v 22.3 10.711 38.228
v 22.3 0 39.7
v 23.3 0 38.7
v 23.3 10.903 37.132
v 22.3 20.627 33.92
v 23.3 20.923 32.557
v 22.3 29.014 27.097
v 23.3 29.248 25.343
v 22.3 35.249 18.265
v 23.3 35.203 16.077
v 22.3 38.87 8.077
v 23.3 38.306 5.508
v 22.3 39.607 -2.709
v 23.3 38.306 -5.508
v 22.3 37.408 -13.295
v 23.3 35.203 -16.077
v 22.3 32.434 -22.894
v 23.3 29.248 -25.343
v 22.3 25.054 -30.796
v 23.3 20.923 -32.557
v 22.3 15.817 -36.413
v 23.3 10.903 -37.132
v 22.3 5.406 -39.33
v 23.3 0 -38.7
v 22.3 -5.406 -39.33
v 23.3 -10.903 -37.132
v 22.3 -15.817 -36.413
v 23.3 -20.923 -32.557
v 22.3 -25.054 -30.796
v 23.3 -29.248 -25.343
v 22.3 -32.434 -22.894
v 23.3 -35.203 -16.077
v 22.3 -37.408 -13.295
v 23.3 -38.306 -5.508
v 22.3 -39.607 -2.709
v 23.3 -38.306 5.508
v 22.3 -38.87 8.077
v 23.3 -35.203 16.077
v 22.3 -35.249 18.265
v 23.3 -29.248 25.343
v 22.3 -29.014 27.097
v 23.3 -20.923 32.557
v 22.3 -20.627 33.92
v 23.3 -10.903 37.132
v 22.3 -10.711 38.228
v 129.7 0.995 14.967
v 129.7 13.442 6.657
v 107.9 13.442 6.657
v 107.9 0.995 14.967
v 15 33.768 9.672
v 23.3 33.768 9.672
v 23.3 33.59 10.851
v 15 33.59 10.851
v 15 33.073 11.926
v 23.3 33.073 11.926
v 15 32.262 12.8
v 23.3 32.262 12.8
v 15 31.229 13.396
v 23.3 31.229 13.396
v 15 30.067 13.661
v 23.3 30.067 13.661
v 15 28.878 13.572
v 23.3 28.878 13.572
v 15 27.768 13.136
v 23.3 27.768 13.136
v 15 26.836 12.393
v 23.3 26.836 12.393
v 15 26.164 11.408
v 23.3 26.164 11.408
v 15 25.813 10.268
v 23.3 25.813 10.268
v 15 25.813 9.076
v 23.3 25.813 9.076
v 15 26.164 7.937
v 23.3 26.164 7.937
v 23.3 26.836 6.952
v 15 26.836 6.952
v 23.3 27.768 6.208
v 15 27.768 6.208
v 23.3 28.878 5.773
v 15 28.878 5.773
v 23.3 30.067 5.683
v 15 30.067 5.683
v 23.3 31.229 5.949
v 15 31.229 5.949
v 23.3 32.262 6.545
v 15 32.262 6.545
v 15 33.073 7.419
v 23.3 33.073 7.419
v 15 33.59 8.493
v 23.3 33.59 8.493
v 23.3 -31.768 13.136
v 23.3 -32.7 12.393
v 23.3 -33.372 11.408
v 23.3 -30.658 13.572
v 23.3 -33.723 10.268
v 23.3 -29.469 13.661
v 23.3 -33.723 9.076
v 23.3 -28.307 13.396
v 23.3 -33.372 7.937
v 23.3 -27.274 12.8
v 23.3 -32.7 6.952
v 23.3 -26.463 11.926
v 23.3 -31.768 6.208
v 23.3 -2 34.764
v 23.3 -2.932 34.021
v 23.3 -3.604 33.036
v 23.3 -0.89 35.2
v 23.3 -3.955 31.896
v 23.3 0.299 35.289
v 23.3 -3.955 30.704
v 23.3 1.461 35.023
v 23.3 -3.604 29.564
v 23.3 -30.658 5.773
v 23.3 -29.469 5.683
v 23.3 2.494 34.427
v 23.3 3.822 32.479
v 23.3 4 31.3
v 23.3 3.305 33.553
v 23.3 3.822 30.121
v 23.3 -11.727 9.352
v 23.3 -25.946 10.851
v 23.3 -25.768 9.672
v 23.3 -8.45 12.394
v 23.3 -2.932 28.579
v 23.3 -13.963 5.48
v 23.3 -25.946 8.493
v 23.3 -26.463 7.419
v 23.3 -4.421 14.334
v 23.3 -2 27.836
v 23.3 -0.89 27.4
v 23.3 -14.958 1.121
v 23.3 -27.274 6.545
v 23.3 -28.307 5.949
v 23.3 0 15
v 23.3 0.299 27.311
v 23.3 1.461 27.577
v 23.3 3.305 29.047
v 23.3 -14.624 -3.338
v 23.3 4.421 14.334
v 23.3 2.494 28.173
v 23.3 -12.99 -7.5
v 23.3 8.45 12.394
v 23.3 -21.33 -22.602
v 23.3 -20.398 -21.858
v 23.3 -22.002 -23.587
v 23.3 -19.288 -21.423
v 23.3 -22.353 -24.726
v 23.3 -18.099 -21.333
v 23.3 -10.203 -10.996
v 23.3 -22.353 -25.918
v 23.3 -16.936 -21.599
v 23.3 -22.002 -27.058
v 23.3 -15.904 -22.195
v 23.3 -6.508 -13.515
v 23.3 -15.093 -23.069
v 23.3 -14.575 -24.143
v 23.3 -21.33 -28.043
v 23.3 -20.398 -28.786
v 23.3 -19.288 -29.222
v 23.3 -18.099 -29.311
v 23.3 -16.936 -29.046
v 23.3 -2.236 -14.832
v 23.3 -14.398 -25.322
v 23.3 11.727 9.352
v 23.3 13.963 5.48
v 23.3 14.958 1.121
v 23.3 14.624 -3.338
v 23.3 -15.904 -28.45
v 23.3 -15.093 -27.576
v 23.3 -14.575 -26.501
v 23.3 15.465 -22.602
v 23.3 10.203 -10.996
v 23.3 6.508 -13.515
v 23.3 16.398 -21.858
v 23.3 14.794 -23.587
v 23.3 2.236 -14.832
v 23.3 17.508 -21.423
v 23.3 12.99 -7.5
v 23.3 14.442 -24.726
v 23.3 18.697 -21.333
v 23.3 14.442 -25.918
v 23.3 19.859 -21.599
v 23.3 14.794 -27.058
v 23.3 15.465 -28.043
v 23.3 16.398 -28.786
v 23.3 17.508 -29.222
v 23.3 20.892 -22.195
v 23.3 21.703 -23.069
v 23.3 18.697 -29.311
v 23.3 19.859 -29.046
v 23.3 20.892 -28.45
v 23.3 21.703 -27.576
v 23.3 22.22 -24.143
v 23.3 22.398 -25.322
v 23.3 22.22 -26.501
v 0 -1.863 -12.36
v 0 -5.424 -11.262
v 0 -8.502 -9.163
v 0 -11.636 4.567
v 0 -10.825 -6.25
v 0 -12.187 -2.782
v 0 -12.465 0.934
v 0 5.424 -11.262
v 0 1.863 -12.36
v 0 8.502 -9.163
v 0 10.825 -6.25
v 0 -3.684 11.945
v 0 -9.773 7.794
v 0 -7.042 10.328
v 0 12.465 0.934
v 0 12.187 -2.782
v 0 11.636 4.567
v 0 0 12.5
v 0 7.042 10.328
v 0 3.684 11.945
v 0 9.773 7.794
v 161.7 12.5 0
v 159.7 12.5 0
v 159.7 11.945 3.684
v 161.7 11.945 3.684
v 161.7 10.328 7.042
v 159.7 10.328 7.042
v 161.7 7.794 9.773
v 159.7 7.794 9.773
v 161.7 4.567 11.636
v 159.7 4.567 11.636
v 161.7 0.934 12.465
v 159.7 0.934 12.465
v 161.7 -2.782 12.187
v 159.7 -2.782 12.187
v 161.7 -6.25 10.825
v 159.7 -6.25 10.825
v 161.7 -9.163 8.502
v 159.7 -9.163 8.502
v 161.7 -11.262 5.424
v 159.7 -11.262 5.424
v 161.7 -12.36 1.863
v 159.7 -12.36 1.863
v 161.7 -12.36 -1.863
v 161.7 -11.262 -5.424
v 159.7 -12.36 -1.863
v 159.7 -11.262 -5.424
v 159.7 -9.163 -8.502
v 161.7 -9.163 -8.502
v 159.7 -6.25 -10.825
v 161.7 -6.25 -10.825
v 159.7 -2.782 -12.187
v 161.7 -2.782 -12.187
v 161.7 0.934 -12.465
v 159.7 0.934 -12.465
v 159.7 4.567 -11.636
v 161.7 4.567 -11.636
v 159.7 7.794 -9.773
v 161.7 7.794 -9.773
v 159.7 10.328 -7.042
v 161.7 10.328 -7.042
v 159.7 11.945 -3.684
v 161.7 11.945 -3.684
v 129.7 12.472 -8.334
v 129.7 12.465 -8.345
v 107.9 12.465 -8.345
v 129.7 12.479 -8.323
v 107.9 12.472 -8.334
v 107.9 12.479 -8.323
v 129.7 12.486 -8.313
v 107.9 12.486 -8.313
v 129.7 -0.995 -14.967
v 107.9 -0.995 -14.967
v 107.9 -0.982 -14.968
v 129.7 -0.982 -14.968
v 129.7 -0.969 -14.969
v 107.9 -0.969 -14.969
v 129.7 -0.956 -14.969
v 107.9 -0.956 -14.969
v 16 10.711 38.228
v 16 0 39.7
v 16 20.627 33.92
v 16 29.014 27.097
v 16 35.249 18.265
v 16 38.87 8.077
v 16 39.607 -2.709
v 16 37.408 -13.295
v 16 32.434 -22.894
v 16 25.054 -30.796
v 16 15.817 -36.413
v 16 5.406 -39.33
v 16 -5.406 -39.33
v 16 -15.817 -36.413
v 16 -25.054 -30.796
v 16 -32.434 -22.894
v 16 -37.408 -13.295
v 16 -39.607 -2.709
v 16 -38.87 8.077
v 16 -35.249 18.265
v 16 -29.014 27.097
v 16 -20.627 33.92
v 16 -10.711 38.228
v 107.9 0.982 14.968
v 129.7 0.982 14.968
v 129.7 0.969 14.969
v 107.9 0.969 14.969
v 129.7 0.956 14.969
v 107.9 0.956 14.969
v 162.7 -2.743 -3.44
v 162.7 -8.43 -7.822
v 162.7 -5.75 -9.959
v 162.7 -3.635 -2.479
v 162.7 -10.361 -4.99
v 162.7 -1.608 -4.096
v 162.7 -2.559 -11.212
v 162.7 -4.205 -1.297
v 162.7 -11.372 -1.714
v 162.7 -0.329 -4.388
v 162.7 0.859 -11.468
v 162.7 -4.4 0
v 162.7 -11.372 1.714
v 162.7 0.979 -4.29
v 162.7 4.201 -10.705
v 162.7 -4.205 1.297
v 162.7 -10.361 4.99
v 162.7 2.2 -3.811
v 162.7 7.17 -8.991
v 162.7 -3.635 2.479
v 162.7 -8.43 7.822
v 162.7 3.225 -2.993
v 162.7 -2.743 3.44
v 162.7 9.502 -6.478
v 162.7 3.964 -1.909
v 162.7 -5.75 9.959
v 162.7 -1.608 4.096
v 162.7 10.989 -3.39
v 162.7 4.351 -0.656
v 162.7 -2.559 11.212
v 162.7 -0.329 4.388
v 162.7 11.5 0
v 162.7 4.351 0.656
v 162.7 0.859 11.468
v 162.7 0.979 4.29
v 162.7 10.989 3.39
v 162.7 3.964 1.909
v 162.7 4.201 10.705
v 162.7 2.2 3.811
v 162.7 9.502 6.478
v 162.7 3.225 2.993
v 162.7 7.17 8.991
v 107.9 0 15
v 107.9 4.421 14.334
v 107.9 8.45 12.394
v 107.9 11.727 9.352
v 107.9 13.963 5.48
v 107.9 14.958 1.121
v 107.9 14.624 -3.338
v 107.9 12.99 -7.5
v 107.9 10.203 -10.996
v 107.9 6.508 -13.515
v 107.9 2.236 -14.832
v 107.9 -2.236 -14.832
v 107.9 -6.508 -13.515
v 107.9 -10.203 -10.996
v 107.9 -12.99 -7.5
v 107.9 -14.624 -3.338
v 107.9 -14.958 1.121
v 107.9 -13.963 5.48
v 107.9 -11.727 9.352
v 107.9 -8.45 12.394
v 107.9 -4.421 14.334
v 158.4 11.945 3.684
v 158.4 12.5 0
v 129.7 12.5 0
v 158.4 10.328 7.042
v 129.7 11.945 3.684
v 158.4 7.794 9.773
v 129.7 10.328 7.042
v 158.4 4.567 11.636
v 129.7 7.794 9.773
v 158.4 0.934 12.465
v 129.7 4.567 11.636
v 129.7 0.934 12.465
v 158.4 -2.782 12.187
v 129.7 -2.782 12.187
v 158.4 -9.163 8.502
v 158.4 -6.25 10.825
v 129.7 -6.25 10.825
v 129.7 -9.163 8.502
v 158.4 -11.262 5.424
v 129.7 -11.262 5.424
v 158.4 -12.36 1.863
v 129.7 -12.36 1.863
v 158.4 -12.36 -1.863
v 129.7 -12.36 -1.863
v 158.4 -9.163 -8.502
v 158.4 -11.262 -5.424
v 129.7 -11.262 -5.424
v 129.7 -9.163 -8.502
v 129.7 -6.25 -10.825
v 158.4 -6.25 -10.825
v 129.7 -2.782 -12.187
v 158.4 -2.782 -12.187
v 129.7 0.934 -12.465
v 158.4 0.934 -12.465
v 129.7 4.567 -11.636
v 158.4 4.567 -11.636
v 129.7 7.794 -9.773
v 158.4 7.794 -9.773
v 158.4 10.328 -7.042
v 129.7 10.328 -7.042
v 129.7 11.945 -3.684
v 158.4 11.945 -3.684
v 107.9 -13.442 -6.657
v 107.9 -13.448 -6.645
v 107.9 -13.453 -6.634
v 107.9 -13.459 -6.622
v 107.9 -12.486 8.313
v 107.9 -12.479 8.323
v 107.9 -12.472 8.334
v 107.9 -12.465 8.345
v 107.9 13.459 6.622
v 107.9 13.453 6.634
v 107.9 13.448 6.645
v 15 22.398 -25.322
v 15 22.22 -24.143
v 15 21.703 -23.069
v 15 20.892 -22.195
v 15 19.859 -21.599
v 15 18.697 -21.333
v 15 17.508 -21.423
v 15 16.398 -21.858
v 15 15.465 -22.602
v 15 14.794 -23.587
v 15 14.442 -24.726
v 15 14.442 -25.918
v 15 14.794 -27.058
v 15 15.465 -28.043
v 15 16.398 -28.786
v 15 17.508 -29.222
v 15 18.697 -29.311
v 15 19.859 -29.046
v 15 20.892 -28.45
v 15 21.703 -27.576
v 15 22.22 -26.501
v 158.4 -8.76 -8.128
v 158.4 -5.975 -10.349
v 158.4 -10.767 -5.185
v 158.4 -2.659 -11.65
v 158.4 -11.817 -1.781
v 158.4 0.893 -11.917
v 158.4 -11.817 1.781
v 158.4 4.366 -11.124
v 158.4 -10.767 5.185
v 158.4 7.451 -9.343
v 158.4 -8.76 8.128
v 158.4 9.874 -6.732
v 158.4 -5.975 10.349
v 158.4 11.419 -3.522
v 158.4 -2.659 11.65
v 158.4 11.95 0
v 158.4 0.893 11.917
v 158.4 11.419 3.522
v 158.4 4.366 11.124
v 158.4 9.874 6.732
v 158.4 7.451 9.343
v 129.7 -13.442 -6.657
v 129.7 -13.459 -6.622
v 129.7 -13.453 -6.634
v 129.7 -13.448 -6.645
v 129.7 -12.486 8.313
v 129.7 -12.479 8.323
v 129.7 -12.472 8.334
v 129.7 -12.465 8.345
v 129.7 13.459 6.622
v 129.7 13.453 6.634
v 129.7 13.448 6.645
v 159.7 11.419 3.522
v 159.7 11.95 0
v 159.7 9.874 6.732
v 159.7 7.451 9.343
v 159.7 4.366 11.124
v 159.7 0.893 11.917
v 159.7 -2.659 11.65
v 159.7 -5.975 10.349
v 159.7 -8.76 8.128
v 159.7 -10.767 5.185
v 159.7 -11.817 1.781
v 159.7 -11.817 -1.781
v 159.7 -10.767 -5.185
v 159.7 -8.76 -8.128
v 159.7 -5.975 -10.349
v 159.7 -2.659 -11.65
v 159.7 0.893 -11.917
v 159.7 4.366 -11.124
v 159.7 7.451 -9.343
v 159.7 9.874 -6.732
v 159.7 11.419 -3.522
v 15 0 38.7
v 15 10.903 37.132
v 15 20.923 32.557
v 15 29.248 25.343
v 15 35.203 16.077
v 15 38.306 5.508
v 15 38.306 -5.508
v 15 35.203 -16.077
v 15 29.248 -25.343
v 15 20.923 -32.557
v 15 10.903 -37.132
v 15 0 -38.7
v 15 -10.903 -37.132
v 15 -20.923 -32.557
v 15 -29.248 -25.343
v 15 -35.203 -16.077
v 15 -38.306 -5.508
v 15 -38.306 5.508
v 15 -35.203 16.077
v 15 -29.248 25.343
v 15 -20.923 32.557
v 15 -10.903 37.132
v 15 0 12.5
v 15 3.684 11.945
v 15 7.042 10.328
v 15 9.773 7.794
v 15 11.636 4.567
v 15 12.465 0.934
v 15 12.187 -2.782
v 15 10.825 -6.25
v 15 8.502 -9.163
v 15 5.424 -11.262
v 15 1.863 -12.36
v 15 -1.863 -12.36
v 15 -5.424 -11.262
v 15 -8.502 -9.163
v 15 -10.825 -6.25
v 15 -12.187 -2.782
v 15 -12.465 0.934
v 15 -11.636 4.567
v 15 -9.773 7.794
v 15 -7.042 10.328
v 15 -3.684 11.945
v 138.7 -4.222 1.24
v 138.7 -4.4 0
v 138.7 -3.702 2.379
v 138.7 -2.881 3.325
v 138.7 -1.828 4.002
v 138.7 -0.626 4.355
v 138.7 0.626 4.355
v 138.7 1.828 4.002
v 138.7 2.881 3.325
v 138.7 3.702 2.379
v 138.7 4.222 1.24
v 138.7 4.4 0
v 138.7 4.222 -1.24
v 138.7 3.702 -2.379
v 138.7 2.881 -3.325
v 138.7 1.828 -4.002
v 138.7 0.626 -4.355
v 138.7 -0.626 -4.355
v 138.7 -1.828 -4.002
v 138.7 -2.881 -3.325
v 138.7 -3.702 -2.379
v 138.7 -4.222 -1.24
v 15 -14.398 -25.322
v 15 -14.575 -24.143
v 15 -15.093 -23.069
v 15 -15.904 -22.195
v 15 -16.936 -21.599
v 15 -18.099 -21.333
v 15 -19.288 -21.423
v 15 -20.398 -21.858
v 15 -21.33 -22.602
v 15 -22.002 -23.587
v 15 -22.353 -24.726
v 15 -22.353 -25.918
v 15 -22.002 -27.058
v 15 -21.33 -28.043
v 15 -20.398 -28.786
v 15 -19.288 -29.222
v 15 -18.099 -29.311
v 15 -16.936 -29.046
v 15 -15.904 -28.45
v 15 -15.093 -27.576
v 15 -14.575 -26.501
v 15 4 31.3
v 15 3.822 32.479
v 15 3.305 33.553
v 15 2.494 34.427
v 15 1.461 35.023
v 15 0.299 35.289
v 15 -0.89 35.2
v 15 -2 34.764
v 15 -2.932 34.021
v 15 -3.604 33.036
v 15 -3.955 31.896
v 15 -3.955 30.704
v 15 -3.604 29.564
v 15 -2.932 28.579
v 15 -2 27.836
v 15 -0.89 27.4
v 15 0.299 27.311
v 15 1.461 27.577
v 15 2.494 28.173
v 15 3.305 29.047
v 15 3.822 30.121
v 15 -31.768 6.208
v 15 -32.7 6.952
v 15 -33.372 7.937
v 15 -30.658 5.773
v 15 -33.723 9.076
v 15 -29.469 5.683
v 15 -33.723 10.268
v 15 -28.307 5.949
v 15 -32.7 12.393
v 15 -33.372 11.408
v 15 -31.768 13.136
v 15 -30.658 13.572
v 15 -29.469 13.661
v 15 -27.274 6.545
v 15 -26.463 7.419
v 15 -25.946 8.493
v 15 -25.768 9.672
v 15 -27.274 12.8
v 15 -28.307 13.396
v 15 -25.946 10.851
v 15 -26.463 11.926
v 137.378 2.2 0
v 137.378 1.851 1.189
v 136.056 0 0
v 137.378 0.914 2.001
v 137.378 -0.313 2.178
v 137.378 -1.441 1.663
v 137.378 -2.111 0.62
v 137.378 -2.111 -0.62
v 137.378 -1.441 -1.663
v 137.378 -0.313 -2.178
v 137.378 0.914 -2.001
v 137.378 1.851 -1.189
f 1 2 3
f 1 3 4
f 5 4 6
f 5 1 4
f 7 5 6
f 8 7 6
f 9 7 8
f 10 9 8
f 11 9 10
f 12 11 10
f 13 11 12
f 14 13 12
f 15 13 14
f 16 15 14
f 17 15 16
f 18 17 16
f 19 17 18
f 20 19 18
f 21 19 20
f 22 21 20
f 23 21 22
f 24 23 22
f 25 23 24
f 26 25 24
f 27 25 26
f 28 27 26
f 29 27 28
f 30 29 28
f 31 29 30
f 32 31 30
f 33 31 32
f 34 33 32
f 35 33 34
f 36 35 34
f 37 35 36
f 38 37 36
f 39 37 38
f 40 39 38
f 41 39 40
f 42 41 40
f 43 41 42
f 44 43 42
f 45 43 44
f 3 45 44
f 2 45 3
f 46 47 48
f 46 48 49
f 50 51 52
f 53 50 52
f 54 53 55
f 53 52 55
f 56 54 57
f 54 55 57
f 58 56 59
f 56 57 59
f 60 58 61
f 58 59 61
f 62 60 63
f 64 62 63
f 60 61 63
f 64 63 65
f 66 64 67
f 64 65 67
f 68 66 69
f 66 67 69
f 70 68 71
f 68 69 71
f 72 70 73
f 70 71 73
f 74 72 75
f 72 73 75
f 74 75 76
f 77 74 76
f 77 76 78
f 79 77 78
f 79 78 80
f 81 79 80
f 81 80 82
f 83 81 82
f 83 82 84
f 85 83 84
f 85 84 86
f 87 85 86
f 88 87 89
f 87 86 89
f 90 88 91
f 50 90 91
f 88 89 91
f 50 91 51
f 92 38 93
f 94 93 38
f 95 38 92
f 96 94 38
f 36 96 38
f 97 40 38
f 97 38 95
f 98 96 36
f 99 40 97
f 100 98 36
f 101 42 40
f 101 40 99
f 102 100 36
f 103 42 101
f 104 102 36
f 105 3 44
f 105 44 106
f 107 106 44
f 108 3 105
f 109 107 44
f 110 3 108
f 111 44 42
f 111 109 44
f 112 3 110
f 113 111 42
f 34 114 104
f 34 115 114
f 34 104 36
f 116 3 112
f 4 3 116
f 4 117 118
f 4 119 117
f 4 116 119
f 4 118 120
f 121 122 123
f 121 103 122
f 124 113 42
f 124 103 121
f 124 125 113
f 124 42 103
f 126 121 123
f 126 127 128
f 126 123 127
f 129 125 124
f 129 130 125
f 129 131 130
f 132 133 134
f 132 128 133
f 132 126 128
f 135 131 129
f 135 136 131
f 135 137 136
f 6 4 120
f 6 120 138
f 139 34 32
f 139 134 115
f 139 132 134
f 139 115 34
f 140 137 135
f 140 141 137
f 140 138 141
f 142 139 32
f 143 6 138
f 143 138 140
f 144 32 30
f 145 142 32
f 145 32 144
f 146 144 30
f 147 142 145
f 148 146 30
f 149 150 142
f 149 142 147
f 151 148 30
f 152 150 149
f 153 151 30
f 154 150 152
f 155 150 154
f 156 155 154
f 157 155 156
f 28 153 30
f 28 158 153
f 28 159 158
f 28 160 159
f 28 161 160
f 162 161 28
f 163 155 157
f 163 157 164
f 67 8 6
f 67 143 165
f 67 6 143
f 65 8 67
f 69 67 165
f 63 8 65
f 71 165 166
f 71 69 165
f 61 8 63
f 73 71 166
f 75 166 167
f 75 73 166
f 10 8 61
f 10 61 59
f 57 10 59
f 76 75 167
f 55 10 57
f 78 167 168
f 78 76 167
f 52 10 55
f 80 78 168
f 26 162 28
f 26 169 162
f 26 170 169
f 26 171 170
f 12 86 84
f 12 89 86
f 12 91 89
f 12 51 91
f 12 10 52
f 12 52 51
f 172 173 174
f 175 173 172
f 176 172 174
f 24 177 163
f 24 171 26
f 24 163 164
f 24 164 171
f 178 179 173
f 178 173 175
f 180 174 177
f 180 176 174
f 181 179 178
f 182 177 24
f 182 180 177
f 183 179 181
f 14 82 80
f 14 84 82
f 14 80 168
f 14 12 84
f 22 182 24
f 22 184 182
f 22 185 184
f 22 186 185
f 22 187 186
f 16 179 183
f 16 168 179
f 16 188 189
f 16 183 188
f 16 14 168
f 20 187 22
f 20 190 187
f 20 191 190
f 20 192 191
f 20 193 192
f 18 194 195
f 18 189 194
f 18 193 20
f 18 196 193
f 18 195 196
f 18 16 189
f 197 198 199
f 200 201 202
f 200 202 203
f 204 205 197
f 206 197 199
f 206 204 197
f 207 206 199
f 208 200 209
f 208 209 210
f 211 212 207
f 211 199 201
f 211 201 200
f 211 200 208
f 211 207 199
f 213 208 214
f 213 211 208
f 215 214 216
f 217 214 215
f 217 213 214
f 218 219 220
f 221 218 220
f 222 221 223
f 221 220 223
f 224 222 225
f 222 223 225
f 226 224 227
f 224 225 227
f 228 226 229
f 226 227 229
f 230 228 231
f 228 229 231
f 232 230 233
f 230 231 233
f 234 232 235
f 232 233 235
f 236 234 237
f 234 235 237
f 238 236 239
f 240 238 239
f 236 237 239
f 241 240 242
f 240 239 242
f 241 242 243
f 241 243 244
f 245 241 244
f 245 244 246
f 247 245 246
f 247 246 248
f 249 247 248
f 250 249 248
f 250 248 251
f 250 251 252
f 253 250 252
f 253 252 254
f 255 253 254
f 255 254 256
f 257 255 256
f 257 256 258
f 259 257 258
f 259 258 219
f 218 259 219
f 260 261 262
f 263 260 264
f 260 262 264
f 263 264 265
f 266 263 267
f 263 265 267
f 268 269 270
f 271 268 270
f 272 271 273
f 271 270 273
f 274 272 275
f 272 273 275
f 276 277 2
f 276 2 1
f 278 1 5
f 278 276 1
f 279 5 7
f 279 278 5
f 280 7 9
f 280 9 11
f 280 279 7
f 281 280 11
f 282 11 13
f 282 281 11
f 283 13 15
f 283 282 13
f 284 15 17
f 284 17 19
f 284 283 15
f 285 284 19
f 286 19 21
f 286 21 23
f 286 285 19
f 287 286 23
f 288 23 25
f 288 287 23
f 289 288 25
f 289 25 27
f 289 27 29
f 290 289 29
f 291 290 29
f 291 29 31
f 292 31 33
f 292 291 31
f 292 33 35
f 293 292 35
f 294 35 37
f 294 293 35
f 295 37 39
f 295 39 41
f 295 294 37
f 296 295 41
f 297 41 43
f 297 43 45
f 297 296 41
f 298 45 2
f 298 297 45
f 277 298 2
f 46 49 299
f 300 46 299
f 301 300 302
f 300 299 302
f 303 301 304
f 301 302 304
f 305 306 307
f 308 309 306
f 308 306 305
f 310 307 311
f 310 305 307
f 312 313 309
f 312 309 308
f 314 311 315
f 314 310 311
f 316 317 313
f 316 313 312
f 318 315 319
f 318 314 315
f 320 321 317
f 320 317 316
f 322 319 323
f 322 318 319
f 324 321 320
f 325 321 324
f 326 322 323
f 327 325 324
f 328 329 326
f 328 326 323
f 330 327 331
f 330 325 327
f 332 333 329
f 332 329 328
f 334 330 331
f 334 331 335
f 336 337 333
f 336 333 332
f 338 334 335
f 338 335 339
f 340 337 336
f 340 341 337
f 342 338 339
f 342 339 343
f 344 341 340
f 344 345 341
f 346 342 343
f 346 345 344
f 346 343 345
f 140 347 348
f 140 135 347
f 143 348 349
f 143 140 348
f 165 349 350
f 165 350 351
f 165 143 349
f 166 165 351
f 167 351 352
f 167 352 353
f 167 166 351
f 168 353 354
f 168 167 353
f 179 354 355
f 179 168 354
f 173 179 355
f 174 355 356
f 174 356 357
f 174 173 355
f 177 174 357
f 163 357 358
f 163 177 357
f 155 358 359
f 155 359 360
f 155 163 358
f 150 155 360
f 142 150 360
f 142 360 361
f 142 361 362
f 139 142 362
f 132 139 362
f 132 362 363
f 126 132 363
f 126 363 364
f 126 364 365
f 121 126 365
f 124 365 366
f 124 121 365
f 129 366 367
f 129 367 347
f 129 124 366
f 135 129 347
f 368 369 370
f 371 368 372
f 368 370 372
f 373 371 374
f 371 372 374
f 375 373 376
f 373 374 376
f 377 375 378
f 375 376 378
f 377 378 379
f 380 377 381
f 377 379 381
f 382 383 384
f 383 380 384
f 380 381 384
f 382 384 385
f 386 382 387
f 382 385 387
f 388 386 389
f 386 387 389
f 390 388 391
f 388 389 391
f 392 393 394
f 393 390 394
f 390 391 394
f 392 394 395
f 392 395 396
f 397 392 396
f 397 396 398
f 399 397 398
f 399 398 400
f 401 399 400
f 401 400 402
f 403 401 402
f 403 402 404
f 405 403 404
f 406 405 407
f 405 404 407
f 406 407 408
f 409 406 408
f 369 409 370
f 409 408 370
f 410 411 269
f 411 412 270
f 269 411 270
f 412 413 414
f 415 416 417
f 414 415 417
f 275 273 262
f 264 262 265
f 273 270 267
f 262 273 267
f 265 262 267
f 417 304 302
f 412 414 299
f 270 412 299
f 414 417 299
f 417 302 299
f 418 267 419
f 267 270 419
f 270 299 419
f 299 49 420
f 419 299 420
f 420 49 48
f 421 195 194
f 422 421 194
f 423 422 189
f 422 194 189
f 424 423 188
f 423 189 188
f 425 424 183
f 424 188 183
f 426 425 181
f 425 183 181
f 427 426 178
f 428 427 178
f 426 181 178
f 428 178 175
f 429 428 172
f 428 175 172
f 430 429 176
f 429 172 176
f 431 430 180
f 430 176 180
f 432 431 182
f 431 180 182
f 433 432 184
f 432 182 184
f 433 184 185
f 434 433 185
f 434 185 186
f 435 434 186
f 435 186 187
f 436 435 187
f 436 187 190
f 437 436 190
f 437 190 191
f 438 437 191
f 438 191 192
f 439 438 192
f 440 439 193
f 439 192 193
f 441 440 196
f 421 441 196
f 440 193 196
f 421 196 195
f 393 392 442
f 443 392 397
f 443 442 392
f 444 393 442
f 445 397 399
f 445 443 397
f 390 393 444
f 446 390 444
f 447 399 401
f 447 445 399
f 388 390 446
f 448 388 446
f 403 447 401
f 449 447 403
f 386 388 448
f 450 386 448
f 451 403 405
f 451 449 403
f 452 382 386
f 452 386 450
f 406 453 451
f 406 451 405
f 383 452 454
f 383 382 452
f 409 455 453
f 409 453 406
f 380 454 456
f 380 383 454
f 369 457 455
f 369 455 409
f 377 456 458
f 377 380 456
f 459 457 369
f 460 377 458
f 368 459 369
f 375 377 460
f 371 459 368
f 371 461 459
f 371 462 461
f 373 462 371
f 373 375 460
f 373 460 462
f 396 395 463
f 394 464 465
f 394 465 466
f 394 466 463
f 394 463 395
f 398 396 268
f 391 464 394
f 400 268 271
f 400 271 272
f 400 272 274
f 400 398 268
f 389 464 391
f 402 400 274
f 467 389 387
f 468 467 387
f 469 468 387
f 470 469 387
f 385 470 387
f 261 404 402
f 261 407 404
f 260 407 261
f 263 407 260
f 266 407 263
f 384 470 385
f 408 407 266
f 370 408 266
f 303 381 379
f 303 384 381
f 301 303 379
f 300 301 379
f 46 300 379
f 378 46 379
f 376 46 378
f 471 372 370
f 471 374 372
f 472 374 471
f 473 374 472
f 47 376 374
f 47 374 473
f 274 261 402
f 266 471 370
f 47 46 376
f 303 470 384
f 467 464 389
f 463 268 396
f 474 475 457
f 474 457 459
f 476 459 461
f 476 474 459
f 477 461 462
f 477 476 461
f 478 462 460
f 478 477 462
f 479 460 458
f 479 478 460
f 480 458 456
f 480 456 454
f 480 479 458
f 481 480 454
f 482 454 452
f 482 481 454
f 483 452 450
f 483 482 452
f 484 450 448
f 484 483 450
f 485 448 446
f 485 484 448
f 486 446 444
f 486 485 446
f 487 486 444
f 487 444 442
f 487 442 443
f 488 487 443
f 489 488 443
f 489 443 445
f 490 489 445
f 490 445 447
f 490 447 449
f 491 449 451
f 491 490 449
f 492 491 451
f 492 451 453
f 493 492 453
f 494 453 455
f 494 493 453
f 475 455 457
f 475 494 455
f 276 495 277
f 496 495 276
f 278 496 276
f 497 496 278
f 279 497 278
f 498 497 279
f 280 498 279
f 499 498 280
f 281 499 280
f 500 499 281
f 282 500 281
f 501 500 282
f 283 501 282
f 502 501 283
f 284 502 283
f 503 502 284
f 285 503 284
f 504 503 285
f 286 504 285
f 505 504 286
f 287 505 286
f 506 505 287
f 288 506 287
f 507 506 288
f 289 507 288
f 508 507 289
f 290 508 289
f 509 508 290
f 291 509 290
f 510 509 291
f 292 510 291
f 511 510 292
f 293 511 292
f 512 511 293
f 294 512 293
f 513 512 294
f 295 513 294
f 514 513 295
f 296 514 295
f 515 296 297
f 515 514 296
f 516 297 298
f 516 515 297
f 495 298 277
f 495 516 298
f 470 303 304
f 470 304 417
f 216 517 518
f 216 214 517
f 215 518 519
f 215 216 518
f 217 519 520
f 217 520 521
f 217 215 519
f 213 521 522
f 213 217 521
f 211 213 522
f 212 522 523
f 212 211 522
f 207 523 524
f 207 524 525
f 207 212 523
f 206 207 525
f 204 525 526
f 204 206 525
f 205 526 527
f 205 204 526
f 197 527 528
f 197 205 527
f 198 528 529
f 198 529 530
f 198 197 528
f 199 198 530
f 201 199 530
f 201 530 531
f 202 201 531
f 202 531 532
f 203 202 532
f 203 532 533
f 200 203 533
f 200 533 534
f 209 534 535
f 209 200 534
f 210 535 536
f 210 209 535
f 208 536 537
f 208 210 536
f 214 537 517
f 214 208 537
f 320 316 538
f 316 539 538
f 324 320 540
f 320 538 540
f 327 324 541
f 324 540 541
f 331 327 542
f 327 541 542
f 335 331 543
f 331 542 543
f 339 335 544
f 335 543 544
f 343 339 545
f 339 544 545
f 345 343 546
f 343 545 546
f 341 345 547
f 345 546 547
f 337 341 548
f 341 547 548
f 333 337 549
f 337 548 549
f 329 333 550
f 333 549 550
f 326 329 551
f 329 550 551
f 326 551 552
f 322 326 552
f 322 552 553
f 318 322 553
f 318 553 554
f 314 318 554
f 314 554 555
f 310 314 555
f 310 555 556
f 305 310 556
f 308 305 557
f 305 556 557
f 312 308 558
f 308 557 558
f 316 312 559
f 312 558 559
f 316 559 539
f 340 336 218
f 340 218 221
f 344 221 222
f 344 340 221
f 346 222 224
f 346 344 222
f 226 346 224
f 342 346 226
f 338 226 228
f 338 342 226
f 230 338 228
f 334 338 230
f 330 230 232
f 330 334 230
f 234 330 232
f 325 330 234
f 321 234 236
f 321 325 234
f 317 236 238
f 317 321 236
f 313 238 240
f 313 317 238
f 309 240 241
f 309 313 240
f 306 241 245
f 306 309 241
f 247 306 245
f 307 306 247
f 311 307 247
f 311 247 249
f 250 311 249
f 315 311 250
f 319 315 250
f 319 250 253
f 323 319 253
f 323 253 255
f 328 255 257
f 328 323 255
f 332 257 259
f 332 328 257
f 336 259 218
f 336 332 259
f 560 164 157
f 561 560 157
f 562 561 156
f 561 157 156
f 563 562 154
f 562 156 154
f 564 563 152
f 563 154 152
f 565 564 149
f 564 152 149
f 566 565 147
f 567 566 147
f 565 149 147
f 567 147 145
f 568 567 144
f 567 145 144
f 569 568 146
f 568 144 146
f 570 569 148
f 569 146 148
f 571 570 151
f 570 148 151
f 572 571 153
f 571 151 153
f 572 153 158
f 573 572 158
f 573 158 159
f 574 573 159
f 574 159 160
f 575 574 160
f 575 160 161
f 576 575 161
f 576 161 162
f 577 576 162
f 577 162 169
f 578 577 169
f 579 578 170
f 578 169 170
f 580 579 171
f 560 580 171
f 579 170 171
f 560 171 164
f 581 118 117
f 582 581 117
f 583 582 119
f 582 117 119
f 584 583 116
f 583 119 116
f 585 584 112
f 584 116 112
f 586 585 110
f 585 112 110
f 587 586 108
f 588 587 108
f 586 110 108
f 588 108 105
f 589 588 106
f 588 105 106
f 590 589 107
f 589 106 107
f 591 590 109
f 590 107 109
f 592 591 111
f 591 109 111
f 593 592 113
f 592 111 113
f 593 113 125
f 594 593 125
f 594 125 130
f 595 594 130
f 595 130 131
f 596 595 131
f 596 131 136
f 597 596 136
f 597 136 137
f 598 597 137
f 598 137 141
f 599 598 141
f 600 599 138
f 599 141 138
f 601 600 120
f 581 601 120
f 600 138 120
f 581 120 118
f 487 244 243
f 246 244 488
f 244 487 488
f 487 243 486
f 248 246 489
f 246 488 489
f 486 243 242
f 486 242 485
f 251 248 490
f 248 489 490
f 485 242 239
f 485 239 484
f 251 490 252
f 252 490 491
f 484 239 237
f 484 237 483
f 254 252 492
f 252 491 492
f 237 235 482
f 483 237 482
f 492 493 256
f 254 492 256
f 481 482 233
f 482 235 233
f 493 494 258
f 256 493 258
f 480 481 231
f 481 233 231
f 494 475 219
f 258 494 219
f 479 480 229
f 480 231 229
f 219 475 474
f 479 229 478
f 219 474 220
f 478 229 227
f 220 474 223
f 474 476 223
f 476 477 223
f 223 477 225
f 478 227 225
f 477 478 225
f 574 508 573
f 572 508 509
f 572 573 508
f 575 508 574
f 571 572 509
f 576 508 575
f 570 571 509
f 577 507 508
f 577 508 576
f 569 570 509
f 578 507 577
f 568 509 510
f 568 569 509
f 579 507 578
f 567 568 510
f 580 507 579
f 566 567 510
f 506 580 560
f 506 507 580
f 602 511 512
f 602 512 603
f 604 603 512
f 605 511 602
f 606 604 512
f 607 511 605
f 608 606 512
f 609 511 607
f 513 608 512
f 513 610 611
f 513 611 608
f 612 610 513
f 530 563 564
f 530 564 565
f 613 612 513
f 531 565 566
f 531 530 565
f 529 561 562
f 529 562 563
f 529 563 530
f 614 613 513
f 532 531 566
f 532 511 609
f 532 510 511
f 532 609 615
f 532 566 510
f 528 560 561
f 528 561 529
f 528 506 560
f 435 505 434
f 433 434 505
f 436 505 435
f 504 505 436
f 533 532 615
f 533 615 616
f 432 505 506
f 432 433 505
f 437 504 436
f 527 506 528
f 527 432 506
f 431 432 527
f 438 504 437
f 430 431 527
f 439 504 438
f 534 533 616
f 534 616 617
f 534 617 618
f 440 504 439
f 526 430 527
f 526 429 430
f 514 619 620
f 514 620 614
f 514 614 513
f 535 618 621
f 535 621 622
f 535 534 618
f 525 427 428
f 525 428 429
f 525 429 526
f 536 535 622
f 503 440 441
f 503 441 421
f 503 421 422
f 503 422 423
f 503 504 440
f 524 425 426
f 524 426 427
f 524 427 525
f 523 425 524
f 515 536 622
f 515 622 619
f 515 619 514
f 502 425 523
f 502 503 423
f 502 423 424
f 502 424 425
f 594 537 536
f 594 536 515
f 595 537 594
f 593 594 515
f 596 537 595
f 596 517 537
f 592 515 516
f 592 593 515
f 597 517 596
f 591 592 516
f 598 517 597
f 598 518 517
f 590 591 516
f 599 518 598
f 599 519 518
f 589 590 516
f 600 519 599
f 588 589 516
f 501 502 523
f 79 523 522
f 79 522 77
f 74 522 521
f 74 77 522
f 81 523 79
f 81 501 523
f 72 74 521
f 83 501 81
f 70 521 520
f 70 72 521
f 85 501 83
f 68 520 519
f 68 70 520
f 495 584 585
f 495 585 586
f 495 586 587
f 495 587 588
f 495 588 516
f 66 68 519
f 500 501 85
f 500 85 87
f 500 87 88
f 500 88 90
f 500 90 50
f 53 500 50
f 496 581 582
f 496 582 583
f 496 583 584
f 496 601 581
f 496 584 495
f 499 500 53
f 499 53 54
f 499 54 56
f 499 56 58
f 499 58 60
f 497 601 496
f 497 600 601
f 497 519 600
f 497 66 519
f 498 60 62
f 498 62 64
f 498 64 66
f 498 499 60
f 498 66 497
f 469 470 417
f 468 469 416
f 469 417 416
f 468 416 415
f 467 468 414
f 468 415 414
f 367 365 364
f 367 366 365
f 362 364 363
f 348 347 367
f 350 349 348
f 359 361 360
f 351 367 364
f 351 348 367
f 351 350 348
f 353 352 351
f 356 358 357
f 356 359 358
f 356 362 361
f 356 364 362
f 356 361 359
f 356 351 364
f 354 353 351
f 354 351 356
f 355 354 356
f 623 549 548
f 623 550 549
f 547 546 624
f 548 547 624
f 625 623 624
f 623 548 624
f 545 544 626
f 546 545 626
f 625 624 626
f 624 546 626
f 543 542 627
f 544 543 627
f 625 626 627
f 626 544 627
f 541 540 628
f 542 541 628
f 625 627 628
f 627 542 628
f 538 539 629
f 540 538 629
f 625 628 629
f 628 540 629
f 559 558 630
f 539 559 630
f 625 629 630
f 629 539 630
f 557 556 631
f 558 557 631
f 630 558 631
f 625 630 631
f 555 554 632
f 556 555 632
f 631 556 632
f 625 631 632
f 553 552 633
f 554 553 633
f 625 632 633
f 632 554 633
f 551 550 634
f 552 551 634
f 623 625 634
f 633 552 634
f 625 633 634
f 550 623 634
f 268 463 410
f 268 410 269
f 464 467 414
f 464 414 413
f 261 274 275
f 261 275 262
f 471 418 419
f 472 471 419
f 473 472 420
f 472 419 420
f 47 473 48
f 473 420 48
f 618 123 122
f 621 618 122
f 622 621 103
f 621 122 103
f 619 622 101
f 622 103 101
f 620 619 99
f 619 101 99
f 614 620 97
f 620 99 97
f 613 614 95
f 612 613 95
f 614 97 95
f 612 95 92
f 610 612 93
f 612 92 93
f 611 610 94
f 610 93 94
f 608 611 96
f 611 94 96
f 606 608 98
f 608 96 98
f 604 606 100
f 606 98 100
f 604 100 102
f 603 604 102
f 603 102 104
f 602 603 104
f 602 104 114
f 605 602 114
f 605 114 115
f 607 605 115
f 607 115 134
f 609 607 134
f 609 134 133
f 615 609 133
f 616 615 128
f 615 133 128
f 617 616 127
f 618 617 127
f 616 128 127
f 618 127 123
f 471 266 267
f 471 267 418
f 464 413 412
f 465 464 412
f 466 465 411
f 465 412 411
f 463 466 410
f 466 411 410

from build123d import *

# Parameters (mm, degrees)
F3_DEPTH  = 21.8
F4_R      = 12.5
F5_DEPTH  = 33
F6_SIZE   = 1
F6_2_SIZE = 1
F8_R      = 15
F8_R_2    = 11.95
F9_DEPTH  = 1.3
F10_R     = 4
F11_DEPTH = 8.3
F13_D     = 8.8
F13_DEPTH = 24
F13_TIP   = 2.6437867237


# Not quite as in the source:
# - two fillets or chamfers of one size are made in one step


with BuildPart() as f1:
    # F0 (on Front) → F1 (revolve)
    with BuildSketch(Plane.XZ):
        Polygon((0, 12.5), (0, 0), (107.9, 0), (107.9, 15), (23.3, 15), (23.3, 39.7), (15, 39.7), (15, 12.5), align=None)
    revolve(axis=Axis((53.95, 0, 0), (-1, 0, 0)))

    # F6#2
    f6_2_edges = [f1.edges().sort_by_distance(p)[0] for p in [
        (23.3, 0, -39.7),
        (15, 0, -39.7),
    ]]
    chamfer(f6_2_edges, length=F6_2_SIZE)

    # F10 (on face) → F11 (cut, through all)
    with BuildSketch(Plane.YZ.offset(23.3)):
        with Locations((0, 31.3)):
            Circle(F10_R)
        with Locations((29.76806896, 9.6722319239)):
            Circle(F10_R)
        with Locations((18.3976783968, -25.3222319239)):
            Circle(F10_R)
        with Locations((-18.3976783968, -25.3222319239)):
            Circle(F10_R)
        with Locations((-29.76806896, 9.6722319239)):
            Circle(F10_R)
    extrude(amount=-F11_DEPTH, mode=Mode.SUBTRACT)


with BuildPart() as f3:
    # F2 (on face) → F3 (new body)
    with BuildSketch(Plane.YZ.offset(107.9)):
        with BuildLine():
            Line((-0.9560760495, -14.9694996105), (12.4645414386, -8.3447712207))
            ThreePointArc((12.4645414386, -8.3447712207), (12.4752454622, -8.3287604515), (12.4859289198, -8.3127359521))
            Line((12.4859289198, -8.3127359521), (13.4590545852, 6.622223922))
            ThreePointArc((13.4590545852, 6.622223922), (13.4505408641, 6.6394992629), (13.4420049694, 6.6567636584))
            Line((13.4420049694, 6.6567636584), (0.9945131466, 14.9669951427))
            ThreePointArc((0.9945131466, 14.9669951427), (0.975295402, 14.9682597144), (0.9560760495, 14.9694996105))
            Line((0.9560760495, 14.9694996105), (-12.4645414386, 8.3447712207))
            ThreePointArc((-12.4645414386, 8.3447712207), (-12.4752454622, 8.3287604515), (-12.4859289198, 8.3127359521))
            Line((-12.4859289198, 8.3127359521), (-13.4590545852, -6.622223922))
            ThreePointArc((-13.4590545852, -6.622223922), (-13.4505408641, -6.6394992629), (-13.4420049694, -6.6567636584))
            Line((-13.4420049694, -6.6567636584), (-0.9945131466, -14.9669951427))
            ThreePointArc((-0.9945131466, -14.9669951427), (-0.975295402, -14.9682597144), (-0.9560760495, -14.9694996105))
        make_face()
    extrude(amount=F3_DEPTH)

    # F4 (on face) → F5 (join)
    with BuildSketch(Plane.YZ.offset(129.7)):
        Circle(F4_R)
    extrude(amount=F5_DEPTH)

    # F6
    f6_edges = [f3.edges().sort_by_distance(p)[0] for p in [
        (162.7, -12.5, 0),
    ]]
    chamfer(f6_edges, length=F6_SIZE)

    # F8 (on offset) → F9 (cut)
    with BuildSketch(Plane.YZ.offset(159.7)):
        Circle(F8_R)
        Circle(F8_R_2, mode=Mode.SUBTRACT)
    extrude(amount=-F9_DEPTH, mode=Mode.SUBTRACT)

    # F13
    with Locations(Plane.YZ.offset(162.7)):
        with Locations((0, 0)):
            Hole(F13_D / 2, depth=F13_DEPTH)
            with Locations((0, 0, -(F13_DEPTH + F13_TIP / 2))):  # 118° drill point
                Cone(0, F13_D / 2, F13_TIP, mode=Mode.SUBTRACT)


solid = Compound([f1.part, f3.part])
